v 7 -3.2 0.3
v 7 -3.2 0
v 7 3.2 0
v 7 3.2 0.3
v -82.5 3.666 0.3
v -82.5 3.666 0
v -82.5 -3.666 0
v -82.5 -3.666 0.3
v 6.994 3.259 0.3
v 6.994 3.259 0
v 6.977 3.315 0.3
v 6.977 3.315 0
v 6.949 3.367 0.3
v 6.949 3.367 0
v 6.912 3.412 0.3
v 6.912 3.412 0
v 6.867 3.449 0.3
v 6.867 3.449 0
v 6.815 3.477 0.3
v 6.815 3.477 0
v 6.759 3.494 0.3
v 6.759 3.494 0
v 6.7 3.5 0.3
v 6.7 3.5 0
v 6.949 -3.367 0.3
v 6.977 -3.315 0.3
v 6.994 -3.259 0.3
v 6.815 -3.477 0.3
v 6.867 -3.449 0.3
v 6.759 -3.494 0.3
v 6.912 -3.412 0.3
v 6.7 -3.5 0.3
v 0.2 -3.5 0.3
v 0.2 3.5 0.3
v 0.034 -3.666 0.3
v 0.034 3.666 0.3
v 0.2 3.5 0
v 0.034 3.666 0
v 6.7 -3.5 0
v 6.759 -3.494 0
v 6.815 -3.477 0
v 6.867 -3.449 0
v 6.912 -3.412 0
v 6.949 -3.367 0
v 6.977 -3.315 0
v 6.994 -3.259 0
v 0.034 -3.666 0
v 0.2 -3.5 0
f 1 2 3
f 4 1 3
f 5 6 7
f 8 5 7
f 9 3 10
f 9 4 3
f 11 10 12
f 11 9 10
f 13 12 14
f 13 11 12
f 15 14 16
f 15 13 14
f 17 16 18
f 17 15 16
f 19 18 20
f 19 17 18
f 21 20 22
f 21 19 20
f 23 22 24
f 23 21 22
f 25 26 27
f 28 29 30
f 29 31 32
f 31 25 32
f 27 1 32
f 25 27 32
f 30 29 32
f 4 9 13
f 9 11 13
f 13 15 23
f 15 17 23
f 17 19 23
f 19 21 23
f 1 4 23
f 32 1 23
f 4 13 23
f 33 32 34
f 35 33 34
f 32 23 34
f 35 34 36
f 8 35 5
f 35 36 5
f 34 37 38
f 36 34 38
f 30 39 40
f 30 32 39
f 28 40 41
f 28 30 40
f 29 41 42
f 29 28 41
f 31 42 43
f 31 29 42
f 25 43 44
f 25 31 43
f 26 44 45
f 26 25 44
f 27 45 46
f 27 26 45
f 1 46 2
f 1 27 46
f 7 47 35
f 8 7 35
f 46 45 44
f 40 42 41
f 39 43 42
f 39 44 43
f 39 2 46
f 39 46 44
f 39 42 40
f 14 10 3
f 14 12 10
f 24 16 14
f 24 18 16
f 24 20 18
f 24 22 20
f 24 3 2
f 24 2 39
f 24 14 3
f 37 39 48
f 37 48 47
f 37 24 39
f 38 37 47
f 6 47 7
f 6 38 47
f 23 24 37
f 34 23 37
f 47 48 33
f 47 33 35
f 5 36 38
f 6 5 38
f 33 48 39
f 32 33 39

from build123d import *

# Parameters (mm, degrees)
BOSS_EXTRUDE1_DEPTH = 0.3
FILLET1_R           = 0.3
CHAMFER1_SIZE       = 0.2


with BuildPart() as part:
    # Sketch1 → Boss-Extrude1 (new body)
    with BuildSketch(Plane.XY):
        Polygon((0, 3.666), (-82.5, 3.666), (-82.5, -3.666), (0, -3.666), (0, -3.5), (7, -3.5), (7, 3.5), (0, 3.5), align=None)
    extrude(amount=BOSS_EXTRUDE1_DEPTH)

    # Fillet1
    fillet1_edges = [part.edges().sort_by_distance(p)[0] for p in [
        (7, 3.5, 0.15),
        (7, -3.5, 0.15),
    ]]
    fillet(fillet1_edges, radius=FILLET1_R)

    # Chamfer1
    # the kernel refuses this chamfer: 0.2 mm, written as the material it adds along each edge
    with BuildSketch(Plane(origin=(0, 3.5, 0), x_dir=(0.9996219169112966, -0.027495876610587326, 0), z_dir=(0, 0, 1))) as chamfer1_piece_1_section:
        Polygon((CHAMFER1_SIZE * 0.999621916911, CHAMFER1_SIZE * 0.0274958766106), (-CHAMFER1_SIZE * 0.0274958766106, CHAMFER1_SIZE * 0.999621916911), (0, 0), align=None)
    chamfer1_piece_1 = extrude(amount=0.3, mode=Mode.PRIVATE)
    chamfer1_piece_1 = split(chamfer1_piece_1, bisect_by=Plane(origin=(0.068475568, 3.666, 0.15), z_dir=(0, -1, 0)), keep=Keep.TOP, mode=Mode.PRIVATE)
    add(chamfer1_piece_1)
    with BuildSketch(Plane(origin=(0, -3.5, 0), x_dir=(0.9996219169112966, 0.02749587661058735, 0), z_dir=(0, 0, 1))) as chamfer1_piece_2_section:
        Polygon((CHAMFER1_SIZE * 0.999621916911, -CHAMFER1_SIZE * 0.0274958766106), (-CHAMFER1_SIZE * 0.0274958766106, -CHAMFER1_SIZE * 0.999621916911), (0, 0), align=None)
    chamfer1_piece_2 = extrude(amount=0.3, mode=Mode.PRIVATE)
    chamfer1_piece_2 = split(chamfer1_piece_2, bisect_by=Plane(origin=(0.068475568, -3.666, 0.15), z_dir=(0, 1, 0)), keep=Keep.TOP, mode=Mode.PRIVATE)
    add(chamfer1_piece_2)


solid = part.part
